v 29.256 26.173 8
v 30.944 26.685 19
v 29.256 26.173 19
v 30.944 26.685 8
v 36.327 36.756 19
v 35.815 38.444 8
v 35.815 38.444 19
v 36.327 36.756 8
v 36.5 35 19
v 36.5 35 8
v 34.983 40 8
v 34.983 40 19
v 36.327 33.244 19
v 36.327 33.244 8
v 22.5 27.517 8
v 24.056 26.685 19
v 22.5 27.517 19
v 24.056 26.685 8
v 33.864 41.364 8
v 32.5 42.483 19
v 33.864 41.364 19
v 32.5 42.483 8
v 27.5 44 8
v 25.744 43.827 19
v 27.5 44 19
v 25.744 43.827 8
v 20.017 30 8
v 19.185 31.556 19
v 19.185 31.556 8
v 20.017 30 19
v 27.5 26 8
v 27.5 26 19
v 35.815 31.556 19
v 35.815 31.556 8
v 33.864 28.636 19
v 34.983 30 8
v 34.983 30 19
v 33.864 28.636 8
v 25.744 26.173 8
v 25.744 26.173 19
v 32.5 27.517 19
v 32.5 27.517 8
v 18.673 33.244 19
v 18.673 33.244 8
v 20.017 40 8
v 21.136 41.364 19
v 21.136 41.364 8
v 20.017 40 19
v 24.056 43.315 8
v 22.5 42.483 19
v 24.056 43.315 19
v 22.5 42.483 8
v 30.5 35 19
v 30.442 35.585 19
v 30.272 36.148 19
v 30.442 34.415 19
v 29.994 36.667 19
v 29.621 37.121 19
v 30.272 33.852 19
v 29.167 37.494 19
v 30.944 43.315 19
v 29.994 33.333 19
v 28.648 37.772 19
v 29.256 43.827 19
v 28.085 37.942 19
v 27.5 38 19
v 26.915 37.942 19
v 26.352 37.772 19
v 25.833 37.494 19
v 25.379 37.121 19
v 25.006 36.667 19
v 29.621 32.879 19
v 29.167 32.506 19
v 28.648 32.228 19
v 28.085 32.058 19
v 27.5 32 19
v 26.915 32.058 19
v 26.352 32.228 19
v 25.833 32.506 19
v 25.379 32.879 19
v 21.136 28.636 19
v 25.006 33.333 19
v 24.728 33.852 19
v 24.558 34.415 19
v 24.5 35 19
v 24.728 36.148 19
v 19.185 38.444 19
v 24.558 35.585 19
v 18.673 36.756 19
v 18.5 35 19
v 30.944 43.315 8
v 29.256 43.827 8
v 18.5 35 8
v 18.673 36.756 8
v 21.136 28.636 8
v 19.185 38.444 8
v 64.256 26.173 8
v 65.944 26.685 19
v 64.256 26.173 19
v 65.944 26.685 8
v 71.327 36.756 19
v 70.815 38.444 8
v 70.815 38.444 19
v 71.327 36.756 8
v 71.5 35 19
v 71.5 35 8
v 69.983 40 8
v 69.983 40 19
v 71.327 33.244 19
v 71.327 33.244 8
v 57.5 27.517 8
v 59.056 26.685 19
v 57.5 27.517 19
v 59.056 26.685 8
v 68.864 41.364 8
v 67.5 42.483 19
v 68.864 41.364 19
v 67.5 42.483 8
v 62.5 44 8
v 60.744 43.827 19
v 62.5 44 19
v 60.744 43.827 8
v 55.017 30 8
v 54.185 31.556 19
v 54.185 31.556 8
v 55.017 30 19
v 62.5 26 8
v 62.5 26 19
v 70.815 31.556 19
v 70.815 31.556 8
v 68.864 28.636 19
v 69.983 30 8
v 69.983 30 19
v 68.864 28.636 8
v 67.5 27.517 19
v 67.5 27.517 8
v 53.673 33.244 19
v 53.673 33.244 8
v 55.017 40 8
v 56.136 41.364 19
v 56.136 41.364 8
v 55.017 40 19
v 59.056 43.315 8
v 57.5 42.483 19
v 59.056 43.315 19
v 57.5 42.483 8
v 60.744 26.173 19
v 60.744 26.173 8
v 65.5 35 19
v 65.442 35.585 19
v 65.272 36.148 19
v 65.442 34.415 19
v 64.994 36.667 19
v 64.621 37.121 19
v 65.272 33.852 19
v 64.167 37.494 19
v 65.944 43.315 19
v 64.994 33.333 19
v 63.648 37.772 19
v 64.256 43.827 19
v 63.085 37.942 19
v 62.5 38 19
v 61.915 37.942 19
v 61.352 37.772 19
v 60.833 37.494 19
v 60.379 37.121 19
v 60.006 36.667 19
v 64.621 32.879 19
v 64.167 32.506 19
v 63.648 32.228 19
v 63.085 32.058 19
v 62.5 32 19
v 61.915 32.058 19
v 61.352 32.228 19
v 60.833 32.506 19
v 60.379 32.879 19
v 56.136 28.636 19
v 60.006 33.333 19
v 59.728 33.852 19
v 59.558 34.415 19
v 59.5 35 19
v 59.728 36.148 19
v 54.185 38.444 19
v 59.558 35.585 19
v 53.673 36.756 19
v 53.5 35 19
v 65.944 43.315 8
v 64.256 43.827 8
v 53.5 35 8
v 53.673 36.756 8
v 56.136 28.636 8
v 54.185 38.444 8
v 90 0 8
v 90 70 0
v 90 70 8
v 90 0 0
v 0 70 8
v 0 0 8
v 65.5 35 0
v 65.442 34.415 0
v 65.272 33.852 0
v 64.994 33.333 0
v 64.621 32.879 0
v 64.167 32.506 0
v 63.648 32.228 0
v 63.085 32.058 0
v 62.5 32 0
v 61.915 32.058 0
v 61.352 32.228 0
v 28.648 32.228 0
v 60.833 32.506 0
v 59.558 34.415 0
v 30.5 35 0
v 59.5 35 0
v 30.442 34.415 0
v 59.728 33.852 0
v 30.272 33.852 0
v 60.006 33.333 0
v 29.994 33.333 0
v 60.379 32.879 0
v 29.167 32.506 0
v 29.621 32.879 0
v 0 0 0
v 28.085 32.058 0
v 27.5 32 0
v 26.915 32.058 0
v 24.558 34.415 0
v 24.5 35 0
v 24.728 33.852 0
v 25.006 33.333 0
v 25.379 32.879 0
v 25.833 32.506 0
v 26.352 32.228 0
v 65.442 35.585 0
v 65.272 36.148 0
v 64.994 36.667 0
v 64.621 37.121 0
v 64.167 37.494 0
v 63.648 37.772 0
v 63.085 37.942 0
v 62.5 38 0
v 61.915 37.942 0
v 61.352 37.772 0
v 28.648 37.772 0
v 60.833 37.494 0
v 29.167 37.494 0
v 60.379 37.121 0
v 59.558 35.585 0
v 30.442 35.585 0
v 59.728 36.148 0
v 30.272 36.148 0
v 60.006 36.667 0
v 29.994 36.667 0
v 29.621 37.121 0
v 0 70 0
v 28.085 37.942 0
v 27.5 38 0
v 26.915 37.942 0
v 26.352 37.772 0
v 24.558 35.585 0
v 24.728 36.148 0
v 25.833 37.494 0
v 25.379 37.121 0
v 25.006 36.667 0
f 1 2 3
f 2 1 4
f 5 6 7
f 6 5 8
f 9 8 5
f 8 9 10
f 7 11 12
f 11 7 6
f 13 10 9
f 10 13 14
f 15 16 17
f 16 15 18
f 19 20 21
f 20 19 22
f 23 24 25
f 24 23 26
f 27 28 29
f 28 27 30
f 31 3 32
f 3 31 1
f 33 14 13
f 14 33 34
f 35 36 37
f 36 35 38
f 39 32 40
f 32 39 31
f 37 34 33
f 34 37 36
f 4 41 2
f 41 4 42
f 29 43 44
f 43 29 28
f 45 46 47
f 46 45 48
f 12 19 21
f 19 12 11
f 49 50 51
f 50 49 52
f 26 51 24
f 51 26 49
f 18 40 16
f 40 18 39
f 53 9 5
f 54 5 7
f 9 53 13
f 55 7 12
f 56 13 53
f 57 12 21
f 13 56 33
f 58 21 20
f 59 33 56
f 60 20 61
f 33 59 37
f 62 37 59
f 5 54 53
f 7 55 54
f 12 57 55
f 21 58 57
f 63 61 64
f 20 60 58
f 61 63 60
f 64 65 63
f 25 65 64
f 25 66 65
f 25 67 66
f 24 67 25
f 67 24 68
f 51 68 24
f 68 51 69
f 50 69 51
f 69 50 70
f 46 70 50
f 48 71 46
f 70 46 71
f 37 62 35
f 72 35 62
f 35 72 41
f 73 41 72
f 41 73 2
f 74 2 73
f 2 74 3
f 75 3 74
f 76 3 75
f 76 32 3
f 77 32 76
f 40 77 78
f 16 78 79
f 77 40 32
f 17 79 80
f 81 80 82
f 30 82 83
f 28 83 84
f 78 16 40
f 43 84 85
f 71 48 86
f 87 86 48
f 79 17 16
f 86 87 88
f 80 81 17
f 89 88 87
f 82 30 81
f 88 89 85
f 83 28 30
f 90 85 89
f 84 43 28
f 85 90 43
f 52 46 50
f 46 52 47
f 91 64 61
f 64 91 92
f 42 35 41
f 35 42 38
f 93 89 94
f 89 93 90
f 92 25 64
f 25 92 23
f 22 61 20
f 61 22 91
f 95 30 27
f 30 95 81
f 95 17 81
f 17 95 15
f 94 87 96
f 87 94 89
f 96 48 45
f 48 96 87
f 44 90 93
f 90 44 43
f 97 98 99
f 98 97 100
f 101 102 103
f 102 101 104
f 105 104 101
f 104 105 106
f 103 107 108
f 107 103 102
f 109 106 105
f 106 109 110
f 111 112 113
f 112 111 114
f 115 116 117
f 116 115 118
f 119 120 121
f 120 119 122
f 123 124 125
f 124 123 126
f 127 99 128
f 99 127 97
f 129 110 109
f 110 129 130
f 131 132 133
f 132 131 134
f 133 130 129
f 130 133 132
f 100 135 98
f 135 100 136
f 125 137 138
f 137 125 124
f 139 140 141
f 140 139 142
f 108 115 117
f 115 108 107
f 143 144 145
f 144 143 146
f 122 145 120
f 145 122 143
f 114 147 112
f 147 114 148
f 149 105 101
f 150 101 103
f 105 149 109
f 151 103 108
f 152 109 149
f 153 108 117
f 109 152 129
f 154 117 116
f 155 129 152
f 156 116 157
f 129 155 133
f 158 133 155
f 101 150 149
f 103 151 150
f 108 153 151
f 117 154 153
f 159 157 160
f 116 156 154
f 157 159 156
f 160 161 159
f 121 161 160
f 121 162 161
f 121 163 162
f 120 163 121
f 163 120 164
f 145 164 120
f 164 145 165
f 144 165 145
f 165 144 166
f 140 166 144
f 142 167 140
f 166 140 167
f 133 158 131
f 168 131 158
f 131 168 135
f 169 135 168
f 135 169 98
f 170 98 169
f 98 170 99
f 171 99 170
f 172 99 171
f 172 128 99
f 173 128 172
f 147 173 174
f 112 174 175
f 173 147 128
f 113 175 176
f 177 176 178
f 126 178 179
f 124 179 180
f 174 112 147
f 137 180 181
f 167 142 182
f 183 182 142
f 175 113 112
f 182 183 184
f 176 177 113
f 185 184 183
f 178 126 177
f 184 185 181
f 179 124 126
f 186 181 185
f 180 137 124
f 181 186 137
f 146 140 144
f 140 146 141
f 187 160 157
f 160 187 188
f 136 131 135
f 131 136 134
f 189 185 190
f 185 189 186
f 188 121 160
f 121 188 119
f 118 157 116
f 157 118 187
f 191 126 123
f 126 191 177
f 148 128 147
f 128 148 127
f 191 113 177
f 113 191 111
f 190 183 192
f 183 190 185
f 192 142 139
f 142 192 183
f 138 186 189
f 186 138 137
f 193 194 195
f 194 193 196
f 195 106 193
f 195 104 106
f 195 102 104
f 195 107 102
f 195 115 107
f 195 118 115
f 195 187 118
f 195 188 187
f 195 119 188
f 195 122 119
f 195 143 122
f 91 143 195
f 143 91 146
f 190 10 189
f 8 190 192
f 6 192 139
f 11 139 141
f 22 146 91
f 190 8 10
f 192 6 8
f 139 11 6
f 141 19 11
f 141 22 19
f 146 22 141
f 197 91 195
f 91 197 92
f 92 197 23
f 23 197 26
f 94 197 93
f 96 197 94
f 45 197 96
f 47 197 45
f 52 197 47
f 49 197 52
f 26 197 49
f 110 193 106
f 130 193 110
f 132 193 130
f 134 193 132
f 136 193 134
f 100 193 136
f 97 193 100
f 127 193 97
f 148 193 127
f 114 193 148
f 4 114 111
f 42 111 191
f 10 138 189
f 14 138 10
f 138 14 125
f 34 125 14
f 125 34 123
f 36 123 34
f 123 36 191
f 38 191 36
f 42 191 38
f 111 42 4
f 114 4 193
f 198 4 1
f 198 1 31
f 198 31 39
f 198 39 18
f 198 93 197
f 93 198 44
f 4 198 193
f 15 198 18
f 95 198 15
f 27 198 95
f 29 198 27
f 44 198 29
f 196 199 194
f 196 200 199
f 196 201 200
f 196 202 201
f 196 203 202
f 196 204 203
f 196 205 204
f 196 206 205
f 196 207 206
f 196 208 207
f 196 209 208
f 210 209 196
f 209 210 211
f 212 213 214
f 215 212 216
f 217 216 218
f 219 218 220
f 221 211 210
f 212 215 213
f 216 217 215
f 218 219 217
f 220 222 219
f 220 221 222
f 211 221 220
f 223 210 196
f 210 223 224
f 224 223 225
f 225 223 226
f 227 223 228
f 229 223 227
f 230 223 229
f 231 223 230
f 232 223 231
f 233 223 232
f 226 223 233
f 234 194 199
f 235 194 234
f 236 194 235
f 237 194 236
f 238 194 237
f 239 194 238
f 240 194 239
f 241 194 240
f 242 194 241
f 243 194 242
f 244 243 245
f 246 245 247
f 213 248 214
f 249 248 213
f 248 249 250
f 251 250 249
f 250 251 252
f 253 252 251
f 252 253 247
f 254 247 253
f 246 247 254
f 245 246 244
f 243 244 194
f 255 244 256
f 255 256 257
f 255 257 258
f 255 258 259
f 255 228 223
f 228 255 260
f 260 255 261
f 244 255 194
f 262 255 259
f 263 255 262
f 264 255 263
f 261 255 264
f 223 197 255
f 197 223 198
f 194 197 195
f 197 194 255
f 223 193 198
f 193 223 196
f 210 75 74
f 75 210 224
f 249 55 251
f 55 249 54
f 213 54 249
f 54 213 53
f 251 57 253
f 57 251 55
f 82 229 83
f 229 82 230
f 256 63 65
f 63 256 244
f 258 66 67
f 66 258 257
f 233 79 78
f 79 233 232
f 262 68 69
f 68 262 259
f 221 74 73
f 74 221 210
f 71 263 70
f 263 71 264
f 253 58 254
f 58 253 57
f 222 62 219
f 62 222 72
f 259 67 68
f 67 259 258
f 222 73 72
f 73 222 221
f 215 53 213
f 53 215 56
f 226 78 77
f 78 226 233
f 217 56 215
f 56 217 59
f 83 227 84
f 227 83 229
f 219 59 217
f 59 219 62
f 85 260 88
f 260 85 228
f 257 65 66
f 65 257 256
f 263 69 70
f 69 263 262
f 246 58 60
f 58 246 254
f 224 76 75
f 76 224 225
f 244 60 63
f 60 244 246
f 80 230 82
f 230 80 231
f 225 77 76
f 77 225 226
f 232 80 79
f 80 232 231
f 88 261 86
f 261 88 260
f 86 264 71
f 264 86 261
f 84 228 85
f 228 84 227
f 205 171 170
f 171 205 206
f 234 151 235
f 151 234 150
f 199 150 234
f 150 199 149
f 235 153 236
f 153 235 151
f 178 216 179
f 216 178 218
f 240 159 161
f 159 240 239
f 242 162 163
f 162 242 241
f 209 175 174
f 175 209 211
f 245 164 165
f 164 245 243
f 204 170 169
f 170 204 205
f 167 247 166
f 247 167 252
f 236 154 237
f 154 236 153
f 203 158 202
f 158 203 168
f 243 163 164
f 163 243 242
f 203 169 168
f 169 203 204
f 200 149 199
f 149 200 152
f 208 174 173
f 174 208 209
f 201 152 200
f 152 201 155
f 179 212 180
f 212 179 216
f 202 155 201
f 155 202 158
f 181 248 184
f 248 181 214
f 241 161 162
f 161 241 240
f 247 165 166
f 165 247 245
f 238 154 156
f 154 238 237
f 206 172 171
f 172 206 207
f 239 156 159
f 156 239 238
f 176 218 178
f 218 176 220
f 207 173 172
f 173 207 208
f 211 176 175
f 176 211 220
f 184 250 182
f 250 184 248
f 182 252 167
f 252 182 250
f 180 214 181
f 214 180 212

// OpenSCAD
$fn = 32;

// ----------------------------------------------------------------------
// Drill jig: two_boss jig
// ----------------------------------------------------------------------

// --- parameters (mm) ---
plate_l = 90;             // plate length, X
plate_w = 70;             // plate width, Y
plate_t = 8;              // plate thickness
boss_d = 18;              // guide boss diameter
boss_h = 12;              // boss height above the plate
guide_d = 6;              // guide hole diameter
boss_pitch = 35;          // boss pitch

n_boss = 2;  // guide bosses
boss_x0 = (plate_l - (n_boss - 1) * boss_pitch) / 2;  // first boss X
boss_top = plate_t - 1 + boss_h;  // boss crown height
total_h = boss_top;  // overall height

difference() {
  union() {
  cube([plate_l, plate_w, plate_t]);
  for (i = [0 : n_boss - 1])
    translate([boss_x0 + i * boss_pitch, plate_w / 2, plate_t - 1])
      cylinder(h = boss_h, d = boss_d);
  }
  for (i = [0 : n_boss - 1])
    translate([boss_x0 + i * boss_pitch, plate_w / 2, -1])
      cylinder(h = plate_t + boss_h, d = guide_d);
}
